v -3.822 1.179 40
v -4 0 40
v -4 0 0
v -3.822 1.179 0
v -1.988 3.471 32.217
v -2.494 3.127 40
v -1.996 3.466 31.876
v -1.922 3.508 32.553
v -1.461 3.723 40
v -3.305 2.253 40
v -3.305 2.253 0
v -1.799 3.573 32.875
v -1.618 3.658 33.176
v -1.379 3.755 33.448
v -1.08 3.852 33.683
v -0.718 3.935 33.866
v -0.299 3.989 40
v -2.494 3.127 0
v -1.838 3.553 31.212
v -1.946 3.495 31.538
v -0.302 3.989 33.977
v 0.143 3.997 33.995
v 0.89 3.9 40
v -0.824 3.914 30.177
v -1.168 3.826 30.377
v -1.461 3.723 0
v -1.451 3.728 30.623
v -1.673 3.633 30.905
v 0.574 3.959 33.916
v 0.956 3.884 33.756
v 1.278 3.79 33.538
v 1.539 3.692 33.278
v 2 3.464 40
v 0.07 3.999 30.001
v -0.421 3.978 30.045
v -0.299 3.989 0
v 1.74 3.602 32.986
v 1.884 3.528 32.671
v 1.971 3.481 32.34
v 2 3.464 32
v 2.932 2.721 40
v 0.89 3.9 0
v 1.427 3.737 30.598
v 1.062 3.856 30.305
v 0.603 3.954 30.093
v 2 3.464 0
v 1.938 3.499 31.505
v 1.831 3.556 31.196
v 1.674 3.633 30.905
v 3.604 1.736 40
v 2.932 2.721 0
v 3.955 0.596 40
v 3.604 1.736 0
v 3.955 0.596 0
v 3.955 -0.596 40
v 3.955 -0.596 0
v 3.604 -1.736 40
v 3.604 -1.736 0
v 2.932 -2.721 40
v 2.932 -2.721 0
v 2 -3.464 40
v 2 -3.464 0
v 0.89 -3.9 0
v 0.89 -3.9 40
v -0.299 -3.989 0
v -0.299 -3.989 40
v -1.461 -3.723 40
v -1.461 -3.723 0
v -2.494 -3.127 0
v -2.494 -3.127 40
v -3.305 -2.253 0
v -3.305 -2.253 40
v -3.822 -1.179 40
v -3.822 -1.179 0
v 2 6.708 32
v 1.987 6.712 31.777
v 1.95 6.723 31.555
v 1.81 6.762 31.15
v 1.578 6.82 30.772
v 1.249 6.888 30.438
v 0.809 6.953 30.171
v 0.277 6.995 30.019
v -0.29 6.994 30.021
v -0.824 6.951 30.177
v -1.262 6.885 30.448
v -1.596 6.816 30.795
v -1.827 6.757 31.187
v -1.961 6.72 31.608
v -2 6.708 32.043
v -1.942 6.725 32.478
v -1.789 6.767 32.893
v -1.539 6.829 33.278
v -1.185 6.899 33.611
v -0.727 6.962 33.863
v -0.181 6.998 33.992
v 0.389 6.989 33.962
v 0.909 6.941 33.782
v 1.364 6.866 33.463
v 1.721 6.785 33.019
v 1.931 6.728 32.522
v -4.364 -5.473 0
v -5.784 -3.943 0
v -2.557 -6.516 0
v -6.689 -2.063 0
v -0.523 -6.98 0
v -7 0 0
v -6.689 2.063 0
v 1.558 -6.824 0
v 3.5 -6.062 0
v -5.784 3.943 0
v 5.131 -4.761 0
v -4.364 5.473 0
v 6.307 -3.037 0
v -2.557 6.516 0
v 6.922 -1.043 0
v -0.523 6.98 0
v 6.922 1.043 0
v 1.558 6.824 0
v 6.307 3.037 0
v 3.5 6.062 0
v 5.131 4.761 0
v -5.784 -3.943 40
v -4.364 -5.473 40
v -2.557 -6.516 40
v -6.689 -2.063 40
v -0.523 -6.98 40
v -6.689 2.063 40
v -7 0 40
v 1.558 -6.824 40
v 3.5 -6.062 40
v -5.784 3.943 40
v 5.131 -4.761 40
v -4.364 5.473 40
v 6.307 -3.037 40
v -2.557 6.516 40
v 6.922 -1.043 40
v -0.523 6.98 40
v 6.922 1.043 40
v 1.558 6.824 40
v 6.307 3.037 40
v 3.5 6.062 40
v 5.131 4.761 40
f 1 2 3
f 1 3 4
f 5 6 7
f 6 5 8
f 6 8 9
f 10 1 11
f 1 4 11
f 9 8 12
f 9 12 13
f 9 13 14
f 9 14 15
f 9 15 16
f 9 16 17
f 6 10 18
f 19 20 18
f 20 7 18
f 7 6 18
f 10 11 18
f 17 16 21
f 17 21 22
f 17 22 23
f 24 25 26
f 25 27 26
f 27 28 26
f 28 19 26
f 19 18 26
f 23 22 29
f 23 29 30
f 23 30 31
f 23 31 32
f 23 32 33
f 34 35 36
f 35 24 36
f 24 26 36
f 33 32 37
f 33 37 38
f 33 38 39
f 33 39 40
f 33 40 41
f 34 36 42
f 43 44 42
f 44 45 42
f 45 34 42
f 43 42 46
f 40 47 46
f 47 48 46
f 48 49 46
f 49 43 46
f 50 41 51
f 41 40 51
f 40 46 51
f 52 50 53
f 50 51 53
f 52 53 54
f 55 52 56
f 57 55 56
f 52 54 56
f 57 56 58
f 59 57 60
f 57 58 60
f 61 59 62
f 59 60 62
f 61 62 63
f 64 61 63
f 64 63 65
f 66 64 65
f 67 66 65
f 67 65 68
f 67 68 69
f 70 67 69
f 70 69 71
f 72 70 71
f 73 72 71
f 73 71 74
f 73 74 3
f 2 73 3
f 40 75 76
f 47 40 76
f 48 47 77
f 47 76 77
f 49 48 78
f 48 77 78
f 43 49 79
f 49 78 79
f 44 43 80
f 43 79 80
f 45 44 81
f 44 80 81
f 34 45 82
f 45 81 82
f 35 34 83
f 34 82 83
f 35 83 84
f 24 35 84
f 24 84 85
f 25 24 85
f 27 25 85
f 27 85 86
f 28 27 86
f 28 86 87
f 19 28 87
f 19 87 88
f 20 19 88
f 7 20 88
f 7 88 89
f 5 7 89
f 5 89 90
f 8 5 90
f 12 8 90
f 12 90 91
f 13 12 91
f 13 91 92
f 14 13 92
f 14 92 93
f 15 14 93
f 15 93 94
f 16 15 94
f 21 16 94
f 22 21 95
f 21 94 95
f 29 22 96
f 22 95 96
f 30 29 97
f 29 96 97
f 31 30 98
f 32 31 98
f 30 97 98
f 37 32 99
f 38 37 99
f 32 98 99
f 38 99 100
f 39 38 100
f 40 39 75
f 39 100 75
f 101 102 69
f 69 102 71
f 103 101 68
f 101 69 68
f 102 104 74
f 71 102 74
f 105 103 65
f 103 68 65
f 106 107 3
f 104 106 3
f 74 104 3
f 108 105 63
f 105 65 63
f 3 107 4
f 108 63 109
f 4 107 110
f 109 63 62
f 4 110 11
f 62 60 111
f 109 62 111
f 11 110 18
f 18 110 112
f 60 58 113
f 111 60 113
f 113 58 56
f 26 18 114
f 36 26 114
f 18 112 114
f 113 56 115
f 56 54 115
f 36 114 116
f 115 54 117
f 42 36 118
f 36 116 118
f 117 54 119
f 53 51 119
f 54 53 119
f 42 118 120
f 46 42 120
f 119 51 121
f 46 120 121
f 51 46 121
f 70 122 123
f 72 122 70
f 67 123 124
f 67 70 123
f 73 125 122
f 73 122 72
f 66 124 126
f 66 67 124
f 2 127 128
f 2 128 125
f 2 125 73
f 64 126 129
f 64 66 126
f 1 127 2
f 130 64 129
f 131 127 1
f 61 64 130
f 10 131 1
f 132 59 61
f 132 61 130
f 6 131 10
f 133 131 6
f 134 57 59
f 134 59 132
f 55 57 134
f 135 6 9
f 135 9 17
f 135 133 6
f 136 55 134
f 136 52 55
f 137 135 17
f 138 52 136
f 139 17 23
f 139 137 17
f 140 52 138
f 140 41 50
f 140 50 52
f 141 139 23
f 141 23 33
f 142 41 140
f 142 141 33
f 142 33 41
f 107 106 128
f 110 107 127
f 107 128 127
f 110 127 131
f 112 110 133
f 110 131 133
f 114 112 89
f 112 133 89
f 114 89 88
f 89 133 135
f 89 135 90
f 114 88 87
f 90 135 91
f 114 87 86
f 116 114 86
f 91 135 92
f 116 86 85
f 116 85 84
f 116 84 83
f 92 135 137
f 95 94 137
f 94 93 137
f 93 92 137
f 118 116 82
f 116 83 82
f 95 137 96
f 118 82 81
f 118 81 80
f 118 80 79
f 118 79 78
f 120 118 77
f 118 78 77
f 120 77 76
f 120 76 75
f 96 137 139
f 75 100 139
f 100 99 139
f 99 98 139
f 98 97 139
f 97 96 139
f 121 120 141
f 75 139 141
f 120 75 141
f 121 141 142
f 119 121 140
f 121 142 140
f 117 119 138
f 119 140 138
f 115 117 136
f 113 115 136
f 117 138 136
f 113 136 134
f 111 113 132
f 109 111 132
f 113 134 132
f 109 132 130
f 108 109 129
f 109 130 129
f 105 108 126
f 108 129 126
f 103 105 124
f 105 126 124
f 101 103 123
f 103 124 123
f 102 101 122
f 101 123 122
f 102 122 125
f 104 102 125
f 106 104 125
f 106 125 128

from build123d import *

# Parameters (mm, degrees)
SKETCH1_W                     = 7
SKETCH1_H                     = 40
F_8_0_8_DIAMETER_HOLE1_D      = 8
F_4_0_4_DIAMETER_HOLE1_REACH  = 37.623
F_4_0_4_DIAMETER_HOLE1_BORE_R = 2


with BuildPart() as part:
    # Sketch1 → Revolve1 (revolve)
    with BuildSketch(Plane.XZ, mode=Mode.PRIVATE) as revolve1_sk:
        with Locations((3.5, 20)):
            Rectangle(SKETCH1_W, SKETCH1_H)
    revolve(revolve1_sk.sketch.rotate(Axis((0, 0, 40), (0, 0, -1)), 180), axis=Axis((0, 0, 40), (0, 0, -1)))

    # Ø8.0 (8) Diameter Hole1 (through all)
    with Locations(Plane.XY.offset(40)):
        with Locations((0, 0)):
            Hole(F_8_0_8_DIAMETER_HOLE1_D / 2)

    # Ø4.0 (4) Diameter Hole1 bore (on position points) → Ø4.0 (4) Diameter Hole1 (cut, up to next)
    with BuildSketch(Plane(origin=(0, 7, 32), x_dir=(1, 0, 0), z_dir=(0, 1, 0)), mode=Mode.PRIVATE) as f_4_0_4_diameter_hole1_sk1:
        Circle(F_4_0_4_DIAMETER_HOLE1_BORE_R)
    f_4_0_4_diameter_hole1_tool1 = extrude(f_4_0_4_diameter_hole1_sk1.sketch, amount=-F_4_0_4_DIAMETER_HOLE1_REACH, mode=Mode.PRIVATE) & part.part
    add(f_4_0_4_diameter_hole1_tool1.solids().sort_by_distance((0, 7, 32))[0], mode=Mode.SUBTRACT)


solid = part.part
